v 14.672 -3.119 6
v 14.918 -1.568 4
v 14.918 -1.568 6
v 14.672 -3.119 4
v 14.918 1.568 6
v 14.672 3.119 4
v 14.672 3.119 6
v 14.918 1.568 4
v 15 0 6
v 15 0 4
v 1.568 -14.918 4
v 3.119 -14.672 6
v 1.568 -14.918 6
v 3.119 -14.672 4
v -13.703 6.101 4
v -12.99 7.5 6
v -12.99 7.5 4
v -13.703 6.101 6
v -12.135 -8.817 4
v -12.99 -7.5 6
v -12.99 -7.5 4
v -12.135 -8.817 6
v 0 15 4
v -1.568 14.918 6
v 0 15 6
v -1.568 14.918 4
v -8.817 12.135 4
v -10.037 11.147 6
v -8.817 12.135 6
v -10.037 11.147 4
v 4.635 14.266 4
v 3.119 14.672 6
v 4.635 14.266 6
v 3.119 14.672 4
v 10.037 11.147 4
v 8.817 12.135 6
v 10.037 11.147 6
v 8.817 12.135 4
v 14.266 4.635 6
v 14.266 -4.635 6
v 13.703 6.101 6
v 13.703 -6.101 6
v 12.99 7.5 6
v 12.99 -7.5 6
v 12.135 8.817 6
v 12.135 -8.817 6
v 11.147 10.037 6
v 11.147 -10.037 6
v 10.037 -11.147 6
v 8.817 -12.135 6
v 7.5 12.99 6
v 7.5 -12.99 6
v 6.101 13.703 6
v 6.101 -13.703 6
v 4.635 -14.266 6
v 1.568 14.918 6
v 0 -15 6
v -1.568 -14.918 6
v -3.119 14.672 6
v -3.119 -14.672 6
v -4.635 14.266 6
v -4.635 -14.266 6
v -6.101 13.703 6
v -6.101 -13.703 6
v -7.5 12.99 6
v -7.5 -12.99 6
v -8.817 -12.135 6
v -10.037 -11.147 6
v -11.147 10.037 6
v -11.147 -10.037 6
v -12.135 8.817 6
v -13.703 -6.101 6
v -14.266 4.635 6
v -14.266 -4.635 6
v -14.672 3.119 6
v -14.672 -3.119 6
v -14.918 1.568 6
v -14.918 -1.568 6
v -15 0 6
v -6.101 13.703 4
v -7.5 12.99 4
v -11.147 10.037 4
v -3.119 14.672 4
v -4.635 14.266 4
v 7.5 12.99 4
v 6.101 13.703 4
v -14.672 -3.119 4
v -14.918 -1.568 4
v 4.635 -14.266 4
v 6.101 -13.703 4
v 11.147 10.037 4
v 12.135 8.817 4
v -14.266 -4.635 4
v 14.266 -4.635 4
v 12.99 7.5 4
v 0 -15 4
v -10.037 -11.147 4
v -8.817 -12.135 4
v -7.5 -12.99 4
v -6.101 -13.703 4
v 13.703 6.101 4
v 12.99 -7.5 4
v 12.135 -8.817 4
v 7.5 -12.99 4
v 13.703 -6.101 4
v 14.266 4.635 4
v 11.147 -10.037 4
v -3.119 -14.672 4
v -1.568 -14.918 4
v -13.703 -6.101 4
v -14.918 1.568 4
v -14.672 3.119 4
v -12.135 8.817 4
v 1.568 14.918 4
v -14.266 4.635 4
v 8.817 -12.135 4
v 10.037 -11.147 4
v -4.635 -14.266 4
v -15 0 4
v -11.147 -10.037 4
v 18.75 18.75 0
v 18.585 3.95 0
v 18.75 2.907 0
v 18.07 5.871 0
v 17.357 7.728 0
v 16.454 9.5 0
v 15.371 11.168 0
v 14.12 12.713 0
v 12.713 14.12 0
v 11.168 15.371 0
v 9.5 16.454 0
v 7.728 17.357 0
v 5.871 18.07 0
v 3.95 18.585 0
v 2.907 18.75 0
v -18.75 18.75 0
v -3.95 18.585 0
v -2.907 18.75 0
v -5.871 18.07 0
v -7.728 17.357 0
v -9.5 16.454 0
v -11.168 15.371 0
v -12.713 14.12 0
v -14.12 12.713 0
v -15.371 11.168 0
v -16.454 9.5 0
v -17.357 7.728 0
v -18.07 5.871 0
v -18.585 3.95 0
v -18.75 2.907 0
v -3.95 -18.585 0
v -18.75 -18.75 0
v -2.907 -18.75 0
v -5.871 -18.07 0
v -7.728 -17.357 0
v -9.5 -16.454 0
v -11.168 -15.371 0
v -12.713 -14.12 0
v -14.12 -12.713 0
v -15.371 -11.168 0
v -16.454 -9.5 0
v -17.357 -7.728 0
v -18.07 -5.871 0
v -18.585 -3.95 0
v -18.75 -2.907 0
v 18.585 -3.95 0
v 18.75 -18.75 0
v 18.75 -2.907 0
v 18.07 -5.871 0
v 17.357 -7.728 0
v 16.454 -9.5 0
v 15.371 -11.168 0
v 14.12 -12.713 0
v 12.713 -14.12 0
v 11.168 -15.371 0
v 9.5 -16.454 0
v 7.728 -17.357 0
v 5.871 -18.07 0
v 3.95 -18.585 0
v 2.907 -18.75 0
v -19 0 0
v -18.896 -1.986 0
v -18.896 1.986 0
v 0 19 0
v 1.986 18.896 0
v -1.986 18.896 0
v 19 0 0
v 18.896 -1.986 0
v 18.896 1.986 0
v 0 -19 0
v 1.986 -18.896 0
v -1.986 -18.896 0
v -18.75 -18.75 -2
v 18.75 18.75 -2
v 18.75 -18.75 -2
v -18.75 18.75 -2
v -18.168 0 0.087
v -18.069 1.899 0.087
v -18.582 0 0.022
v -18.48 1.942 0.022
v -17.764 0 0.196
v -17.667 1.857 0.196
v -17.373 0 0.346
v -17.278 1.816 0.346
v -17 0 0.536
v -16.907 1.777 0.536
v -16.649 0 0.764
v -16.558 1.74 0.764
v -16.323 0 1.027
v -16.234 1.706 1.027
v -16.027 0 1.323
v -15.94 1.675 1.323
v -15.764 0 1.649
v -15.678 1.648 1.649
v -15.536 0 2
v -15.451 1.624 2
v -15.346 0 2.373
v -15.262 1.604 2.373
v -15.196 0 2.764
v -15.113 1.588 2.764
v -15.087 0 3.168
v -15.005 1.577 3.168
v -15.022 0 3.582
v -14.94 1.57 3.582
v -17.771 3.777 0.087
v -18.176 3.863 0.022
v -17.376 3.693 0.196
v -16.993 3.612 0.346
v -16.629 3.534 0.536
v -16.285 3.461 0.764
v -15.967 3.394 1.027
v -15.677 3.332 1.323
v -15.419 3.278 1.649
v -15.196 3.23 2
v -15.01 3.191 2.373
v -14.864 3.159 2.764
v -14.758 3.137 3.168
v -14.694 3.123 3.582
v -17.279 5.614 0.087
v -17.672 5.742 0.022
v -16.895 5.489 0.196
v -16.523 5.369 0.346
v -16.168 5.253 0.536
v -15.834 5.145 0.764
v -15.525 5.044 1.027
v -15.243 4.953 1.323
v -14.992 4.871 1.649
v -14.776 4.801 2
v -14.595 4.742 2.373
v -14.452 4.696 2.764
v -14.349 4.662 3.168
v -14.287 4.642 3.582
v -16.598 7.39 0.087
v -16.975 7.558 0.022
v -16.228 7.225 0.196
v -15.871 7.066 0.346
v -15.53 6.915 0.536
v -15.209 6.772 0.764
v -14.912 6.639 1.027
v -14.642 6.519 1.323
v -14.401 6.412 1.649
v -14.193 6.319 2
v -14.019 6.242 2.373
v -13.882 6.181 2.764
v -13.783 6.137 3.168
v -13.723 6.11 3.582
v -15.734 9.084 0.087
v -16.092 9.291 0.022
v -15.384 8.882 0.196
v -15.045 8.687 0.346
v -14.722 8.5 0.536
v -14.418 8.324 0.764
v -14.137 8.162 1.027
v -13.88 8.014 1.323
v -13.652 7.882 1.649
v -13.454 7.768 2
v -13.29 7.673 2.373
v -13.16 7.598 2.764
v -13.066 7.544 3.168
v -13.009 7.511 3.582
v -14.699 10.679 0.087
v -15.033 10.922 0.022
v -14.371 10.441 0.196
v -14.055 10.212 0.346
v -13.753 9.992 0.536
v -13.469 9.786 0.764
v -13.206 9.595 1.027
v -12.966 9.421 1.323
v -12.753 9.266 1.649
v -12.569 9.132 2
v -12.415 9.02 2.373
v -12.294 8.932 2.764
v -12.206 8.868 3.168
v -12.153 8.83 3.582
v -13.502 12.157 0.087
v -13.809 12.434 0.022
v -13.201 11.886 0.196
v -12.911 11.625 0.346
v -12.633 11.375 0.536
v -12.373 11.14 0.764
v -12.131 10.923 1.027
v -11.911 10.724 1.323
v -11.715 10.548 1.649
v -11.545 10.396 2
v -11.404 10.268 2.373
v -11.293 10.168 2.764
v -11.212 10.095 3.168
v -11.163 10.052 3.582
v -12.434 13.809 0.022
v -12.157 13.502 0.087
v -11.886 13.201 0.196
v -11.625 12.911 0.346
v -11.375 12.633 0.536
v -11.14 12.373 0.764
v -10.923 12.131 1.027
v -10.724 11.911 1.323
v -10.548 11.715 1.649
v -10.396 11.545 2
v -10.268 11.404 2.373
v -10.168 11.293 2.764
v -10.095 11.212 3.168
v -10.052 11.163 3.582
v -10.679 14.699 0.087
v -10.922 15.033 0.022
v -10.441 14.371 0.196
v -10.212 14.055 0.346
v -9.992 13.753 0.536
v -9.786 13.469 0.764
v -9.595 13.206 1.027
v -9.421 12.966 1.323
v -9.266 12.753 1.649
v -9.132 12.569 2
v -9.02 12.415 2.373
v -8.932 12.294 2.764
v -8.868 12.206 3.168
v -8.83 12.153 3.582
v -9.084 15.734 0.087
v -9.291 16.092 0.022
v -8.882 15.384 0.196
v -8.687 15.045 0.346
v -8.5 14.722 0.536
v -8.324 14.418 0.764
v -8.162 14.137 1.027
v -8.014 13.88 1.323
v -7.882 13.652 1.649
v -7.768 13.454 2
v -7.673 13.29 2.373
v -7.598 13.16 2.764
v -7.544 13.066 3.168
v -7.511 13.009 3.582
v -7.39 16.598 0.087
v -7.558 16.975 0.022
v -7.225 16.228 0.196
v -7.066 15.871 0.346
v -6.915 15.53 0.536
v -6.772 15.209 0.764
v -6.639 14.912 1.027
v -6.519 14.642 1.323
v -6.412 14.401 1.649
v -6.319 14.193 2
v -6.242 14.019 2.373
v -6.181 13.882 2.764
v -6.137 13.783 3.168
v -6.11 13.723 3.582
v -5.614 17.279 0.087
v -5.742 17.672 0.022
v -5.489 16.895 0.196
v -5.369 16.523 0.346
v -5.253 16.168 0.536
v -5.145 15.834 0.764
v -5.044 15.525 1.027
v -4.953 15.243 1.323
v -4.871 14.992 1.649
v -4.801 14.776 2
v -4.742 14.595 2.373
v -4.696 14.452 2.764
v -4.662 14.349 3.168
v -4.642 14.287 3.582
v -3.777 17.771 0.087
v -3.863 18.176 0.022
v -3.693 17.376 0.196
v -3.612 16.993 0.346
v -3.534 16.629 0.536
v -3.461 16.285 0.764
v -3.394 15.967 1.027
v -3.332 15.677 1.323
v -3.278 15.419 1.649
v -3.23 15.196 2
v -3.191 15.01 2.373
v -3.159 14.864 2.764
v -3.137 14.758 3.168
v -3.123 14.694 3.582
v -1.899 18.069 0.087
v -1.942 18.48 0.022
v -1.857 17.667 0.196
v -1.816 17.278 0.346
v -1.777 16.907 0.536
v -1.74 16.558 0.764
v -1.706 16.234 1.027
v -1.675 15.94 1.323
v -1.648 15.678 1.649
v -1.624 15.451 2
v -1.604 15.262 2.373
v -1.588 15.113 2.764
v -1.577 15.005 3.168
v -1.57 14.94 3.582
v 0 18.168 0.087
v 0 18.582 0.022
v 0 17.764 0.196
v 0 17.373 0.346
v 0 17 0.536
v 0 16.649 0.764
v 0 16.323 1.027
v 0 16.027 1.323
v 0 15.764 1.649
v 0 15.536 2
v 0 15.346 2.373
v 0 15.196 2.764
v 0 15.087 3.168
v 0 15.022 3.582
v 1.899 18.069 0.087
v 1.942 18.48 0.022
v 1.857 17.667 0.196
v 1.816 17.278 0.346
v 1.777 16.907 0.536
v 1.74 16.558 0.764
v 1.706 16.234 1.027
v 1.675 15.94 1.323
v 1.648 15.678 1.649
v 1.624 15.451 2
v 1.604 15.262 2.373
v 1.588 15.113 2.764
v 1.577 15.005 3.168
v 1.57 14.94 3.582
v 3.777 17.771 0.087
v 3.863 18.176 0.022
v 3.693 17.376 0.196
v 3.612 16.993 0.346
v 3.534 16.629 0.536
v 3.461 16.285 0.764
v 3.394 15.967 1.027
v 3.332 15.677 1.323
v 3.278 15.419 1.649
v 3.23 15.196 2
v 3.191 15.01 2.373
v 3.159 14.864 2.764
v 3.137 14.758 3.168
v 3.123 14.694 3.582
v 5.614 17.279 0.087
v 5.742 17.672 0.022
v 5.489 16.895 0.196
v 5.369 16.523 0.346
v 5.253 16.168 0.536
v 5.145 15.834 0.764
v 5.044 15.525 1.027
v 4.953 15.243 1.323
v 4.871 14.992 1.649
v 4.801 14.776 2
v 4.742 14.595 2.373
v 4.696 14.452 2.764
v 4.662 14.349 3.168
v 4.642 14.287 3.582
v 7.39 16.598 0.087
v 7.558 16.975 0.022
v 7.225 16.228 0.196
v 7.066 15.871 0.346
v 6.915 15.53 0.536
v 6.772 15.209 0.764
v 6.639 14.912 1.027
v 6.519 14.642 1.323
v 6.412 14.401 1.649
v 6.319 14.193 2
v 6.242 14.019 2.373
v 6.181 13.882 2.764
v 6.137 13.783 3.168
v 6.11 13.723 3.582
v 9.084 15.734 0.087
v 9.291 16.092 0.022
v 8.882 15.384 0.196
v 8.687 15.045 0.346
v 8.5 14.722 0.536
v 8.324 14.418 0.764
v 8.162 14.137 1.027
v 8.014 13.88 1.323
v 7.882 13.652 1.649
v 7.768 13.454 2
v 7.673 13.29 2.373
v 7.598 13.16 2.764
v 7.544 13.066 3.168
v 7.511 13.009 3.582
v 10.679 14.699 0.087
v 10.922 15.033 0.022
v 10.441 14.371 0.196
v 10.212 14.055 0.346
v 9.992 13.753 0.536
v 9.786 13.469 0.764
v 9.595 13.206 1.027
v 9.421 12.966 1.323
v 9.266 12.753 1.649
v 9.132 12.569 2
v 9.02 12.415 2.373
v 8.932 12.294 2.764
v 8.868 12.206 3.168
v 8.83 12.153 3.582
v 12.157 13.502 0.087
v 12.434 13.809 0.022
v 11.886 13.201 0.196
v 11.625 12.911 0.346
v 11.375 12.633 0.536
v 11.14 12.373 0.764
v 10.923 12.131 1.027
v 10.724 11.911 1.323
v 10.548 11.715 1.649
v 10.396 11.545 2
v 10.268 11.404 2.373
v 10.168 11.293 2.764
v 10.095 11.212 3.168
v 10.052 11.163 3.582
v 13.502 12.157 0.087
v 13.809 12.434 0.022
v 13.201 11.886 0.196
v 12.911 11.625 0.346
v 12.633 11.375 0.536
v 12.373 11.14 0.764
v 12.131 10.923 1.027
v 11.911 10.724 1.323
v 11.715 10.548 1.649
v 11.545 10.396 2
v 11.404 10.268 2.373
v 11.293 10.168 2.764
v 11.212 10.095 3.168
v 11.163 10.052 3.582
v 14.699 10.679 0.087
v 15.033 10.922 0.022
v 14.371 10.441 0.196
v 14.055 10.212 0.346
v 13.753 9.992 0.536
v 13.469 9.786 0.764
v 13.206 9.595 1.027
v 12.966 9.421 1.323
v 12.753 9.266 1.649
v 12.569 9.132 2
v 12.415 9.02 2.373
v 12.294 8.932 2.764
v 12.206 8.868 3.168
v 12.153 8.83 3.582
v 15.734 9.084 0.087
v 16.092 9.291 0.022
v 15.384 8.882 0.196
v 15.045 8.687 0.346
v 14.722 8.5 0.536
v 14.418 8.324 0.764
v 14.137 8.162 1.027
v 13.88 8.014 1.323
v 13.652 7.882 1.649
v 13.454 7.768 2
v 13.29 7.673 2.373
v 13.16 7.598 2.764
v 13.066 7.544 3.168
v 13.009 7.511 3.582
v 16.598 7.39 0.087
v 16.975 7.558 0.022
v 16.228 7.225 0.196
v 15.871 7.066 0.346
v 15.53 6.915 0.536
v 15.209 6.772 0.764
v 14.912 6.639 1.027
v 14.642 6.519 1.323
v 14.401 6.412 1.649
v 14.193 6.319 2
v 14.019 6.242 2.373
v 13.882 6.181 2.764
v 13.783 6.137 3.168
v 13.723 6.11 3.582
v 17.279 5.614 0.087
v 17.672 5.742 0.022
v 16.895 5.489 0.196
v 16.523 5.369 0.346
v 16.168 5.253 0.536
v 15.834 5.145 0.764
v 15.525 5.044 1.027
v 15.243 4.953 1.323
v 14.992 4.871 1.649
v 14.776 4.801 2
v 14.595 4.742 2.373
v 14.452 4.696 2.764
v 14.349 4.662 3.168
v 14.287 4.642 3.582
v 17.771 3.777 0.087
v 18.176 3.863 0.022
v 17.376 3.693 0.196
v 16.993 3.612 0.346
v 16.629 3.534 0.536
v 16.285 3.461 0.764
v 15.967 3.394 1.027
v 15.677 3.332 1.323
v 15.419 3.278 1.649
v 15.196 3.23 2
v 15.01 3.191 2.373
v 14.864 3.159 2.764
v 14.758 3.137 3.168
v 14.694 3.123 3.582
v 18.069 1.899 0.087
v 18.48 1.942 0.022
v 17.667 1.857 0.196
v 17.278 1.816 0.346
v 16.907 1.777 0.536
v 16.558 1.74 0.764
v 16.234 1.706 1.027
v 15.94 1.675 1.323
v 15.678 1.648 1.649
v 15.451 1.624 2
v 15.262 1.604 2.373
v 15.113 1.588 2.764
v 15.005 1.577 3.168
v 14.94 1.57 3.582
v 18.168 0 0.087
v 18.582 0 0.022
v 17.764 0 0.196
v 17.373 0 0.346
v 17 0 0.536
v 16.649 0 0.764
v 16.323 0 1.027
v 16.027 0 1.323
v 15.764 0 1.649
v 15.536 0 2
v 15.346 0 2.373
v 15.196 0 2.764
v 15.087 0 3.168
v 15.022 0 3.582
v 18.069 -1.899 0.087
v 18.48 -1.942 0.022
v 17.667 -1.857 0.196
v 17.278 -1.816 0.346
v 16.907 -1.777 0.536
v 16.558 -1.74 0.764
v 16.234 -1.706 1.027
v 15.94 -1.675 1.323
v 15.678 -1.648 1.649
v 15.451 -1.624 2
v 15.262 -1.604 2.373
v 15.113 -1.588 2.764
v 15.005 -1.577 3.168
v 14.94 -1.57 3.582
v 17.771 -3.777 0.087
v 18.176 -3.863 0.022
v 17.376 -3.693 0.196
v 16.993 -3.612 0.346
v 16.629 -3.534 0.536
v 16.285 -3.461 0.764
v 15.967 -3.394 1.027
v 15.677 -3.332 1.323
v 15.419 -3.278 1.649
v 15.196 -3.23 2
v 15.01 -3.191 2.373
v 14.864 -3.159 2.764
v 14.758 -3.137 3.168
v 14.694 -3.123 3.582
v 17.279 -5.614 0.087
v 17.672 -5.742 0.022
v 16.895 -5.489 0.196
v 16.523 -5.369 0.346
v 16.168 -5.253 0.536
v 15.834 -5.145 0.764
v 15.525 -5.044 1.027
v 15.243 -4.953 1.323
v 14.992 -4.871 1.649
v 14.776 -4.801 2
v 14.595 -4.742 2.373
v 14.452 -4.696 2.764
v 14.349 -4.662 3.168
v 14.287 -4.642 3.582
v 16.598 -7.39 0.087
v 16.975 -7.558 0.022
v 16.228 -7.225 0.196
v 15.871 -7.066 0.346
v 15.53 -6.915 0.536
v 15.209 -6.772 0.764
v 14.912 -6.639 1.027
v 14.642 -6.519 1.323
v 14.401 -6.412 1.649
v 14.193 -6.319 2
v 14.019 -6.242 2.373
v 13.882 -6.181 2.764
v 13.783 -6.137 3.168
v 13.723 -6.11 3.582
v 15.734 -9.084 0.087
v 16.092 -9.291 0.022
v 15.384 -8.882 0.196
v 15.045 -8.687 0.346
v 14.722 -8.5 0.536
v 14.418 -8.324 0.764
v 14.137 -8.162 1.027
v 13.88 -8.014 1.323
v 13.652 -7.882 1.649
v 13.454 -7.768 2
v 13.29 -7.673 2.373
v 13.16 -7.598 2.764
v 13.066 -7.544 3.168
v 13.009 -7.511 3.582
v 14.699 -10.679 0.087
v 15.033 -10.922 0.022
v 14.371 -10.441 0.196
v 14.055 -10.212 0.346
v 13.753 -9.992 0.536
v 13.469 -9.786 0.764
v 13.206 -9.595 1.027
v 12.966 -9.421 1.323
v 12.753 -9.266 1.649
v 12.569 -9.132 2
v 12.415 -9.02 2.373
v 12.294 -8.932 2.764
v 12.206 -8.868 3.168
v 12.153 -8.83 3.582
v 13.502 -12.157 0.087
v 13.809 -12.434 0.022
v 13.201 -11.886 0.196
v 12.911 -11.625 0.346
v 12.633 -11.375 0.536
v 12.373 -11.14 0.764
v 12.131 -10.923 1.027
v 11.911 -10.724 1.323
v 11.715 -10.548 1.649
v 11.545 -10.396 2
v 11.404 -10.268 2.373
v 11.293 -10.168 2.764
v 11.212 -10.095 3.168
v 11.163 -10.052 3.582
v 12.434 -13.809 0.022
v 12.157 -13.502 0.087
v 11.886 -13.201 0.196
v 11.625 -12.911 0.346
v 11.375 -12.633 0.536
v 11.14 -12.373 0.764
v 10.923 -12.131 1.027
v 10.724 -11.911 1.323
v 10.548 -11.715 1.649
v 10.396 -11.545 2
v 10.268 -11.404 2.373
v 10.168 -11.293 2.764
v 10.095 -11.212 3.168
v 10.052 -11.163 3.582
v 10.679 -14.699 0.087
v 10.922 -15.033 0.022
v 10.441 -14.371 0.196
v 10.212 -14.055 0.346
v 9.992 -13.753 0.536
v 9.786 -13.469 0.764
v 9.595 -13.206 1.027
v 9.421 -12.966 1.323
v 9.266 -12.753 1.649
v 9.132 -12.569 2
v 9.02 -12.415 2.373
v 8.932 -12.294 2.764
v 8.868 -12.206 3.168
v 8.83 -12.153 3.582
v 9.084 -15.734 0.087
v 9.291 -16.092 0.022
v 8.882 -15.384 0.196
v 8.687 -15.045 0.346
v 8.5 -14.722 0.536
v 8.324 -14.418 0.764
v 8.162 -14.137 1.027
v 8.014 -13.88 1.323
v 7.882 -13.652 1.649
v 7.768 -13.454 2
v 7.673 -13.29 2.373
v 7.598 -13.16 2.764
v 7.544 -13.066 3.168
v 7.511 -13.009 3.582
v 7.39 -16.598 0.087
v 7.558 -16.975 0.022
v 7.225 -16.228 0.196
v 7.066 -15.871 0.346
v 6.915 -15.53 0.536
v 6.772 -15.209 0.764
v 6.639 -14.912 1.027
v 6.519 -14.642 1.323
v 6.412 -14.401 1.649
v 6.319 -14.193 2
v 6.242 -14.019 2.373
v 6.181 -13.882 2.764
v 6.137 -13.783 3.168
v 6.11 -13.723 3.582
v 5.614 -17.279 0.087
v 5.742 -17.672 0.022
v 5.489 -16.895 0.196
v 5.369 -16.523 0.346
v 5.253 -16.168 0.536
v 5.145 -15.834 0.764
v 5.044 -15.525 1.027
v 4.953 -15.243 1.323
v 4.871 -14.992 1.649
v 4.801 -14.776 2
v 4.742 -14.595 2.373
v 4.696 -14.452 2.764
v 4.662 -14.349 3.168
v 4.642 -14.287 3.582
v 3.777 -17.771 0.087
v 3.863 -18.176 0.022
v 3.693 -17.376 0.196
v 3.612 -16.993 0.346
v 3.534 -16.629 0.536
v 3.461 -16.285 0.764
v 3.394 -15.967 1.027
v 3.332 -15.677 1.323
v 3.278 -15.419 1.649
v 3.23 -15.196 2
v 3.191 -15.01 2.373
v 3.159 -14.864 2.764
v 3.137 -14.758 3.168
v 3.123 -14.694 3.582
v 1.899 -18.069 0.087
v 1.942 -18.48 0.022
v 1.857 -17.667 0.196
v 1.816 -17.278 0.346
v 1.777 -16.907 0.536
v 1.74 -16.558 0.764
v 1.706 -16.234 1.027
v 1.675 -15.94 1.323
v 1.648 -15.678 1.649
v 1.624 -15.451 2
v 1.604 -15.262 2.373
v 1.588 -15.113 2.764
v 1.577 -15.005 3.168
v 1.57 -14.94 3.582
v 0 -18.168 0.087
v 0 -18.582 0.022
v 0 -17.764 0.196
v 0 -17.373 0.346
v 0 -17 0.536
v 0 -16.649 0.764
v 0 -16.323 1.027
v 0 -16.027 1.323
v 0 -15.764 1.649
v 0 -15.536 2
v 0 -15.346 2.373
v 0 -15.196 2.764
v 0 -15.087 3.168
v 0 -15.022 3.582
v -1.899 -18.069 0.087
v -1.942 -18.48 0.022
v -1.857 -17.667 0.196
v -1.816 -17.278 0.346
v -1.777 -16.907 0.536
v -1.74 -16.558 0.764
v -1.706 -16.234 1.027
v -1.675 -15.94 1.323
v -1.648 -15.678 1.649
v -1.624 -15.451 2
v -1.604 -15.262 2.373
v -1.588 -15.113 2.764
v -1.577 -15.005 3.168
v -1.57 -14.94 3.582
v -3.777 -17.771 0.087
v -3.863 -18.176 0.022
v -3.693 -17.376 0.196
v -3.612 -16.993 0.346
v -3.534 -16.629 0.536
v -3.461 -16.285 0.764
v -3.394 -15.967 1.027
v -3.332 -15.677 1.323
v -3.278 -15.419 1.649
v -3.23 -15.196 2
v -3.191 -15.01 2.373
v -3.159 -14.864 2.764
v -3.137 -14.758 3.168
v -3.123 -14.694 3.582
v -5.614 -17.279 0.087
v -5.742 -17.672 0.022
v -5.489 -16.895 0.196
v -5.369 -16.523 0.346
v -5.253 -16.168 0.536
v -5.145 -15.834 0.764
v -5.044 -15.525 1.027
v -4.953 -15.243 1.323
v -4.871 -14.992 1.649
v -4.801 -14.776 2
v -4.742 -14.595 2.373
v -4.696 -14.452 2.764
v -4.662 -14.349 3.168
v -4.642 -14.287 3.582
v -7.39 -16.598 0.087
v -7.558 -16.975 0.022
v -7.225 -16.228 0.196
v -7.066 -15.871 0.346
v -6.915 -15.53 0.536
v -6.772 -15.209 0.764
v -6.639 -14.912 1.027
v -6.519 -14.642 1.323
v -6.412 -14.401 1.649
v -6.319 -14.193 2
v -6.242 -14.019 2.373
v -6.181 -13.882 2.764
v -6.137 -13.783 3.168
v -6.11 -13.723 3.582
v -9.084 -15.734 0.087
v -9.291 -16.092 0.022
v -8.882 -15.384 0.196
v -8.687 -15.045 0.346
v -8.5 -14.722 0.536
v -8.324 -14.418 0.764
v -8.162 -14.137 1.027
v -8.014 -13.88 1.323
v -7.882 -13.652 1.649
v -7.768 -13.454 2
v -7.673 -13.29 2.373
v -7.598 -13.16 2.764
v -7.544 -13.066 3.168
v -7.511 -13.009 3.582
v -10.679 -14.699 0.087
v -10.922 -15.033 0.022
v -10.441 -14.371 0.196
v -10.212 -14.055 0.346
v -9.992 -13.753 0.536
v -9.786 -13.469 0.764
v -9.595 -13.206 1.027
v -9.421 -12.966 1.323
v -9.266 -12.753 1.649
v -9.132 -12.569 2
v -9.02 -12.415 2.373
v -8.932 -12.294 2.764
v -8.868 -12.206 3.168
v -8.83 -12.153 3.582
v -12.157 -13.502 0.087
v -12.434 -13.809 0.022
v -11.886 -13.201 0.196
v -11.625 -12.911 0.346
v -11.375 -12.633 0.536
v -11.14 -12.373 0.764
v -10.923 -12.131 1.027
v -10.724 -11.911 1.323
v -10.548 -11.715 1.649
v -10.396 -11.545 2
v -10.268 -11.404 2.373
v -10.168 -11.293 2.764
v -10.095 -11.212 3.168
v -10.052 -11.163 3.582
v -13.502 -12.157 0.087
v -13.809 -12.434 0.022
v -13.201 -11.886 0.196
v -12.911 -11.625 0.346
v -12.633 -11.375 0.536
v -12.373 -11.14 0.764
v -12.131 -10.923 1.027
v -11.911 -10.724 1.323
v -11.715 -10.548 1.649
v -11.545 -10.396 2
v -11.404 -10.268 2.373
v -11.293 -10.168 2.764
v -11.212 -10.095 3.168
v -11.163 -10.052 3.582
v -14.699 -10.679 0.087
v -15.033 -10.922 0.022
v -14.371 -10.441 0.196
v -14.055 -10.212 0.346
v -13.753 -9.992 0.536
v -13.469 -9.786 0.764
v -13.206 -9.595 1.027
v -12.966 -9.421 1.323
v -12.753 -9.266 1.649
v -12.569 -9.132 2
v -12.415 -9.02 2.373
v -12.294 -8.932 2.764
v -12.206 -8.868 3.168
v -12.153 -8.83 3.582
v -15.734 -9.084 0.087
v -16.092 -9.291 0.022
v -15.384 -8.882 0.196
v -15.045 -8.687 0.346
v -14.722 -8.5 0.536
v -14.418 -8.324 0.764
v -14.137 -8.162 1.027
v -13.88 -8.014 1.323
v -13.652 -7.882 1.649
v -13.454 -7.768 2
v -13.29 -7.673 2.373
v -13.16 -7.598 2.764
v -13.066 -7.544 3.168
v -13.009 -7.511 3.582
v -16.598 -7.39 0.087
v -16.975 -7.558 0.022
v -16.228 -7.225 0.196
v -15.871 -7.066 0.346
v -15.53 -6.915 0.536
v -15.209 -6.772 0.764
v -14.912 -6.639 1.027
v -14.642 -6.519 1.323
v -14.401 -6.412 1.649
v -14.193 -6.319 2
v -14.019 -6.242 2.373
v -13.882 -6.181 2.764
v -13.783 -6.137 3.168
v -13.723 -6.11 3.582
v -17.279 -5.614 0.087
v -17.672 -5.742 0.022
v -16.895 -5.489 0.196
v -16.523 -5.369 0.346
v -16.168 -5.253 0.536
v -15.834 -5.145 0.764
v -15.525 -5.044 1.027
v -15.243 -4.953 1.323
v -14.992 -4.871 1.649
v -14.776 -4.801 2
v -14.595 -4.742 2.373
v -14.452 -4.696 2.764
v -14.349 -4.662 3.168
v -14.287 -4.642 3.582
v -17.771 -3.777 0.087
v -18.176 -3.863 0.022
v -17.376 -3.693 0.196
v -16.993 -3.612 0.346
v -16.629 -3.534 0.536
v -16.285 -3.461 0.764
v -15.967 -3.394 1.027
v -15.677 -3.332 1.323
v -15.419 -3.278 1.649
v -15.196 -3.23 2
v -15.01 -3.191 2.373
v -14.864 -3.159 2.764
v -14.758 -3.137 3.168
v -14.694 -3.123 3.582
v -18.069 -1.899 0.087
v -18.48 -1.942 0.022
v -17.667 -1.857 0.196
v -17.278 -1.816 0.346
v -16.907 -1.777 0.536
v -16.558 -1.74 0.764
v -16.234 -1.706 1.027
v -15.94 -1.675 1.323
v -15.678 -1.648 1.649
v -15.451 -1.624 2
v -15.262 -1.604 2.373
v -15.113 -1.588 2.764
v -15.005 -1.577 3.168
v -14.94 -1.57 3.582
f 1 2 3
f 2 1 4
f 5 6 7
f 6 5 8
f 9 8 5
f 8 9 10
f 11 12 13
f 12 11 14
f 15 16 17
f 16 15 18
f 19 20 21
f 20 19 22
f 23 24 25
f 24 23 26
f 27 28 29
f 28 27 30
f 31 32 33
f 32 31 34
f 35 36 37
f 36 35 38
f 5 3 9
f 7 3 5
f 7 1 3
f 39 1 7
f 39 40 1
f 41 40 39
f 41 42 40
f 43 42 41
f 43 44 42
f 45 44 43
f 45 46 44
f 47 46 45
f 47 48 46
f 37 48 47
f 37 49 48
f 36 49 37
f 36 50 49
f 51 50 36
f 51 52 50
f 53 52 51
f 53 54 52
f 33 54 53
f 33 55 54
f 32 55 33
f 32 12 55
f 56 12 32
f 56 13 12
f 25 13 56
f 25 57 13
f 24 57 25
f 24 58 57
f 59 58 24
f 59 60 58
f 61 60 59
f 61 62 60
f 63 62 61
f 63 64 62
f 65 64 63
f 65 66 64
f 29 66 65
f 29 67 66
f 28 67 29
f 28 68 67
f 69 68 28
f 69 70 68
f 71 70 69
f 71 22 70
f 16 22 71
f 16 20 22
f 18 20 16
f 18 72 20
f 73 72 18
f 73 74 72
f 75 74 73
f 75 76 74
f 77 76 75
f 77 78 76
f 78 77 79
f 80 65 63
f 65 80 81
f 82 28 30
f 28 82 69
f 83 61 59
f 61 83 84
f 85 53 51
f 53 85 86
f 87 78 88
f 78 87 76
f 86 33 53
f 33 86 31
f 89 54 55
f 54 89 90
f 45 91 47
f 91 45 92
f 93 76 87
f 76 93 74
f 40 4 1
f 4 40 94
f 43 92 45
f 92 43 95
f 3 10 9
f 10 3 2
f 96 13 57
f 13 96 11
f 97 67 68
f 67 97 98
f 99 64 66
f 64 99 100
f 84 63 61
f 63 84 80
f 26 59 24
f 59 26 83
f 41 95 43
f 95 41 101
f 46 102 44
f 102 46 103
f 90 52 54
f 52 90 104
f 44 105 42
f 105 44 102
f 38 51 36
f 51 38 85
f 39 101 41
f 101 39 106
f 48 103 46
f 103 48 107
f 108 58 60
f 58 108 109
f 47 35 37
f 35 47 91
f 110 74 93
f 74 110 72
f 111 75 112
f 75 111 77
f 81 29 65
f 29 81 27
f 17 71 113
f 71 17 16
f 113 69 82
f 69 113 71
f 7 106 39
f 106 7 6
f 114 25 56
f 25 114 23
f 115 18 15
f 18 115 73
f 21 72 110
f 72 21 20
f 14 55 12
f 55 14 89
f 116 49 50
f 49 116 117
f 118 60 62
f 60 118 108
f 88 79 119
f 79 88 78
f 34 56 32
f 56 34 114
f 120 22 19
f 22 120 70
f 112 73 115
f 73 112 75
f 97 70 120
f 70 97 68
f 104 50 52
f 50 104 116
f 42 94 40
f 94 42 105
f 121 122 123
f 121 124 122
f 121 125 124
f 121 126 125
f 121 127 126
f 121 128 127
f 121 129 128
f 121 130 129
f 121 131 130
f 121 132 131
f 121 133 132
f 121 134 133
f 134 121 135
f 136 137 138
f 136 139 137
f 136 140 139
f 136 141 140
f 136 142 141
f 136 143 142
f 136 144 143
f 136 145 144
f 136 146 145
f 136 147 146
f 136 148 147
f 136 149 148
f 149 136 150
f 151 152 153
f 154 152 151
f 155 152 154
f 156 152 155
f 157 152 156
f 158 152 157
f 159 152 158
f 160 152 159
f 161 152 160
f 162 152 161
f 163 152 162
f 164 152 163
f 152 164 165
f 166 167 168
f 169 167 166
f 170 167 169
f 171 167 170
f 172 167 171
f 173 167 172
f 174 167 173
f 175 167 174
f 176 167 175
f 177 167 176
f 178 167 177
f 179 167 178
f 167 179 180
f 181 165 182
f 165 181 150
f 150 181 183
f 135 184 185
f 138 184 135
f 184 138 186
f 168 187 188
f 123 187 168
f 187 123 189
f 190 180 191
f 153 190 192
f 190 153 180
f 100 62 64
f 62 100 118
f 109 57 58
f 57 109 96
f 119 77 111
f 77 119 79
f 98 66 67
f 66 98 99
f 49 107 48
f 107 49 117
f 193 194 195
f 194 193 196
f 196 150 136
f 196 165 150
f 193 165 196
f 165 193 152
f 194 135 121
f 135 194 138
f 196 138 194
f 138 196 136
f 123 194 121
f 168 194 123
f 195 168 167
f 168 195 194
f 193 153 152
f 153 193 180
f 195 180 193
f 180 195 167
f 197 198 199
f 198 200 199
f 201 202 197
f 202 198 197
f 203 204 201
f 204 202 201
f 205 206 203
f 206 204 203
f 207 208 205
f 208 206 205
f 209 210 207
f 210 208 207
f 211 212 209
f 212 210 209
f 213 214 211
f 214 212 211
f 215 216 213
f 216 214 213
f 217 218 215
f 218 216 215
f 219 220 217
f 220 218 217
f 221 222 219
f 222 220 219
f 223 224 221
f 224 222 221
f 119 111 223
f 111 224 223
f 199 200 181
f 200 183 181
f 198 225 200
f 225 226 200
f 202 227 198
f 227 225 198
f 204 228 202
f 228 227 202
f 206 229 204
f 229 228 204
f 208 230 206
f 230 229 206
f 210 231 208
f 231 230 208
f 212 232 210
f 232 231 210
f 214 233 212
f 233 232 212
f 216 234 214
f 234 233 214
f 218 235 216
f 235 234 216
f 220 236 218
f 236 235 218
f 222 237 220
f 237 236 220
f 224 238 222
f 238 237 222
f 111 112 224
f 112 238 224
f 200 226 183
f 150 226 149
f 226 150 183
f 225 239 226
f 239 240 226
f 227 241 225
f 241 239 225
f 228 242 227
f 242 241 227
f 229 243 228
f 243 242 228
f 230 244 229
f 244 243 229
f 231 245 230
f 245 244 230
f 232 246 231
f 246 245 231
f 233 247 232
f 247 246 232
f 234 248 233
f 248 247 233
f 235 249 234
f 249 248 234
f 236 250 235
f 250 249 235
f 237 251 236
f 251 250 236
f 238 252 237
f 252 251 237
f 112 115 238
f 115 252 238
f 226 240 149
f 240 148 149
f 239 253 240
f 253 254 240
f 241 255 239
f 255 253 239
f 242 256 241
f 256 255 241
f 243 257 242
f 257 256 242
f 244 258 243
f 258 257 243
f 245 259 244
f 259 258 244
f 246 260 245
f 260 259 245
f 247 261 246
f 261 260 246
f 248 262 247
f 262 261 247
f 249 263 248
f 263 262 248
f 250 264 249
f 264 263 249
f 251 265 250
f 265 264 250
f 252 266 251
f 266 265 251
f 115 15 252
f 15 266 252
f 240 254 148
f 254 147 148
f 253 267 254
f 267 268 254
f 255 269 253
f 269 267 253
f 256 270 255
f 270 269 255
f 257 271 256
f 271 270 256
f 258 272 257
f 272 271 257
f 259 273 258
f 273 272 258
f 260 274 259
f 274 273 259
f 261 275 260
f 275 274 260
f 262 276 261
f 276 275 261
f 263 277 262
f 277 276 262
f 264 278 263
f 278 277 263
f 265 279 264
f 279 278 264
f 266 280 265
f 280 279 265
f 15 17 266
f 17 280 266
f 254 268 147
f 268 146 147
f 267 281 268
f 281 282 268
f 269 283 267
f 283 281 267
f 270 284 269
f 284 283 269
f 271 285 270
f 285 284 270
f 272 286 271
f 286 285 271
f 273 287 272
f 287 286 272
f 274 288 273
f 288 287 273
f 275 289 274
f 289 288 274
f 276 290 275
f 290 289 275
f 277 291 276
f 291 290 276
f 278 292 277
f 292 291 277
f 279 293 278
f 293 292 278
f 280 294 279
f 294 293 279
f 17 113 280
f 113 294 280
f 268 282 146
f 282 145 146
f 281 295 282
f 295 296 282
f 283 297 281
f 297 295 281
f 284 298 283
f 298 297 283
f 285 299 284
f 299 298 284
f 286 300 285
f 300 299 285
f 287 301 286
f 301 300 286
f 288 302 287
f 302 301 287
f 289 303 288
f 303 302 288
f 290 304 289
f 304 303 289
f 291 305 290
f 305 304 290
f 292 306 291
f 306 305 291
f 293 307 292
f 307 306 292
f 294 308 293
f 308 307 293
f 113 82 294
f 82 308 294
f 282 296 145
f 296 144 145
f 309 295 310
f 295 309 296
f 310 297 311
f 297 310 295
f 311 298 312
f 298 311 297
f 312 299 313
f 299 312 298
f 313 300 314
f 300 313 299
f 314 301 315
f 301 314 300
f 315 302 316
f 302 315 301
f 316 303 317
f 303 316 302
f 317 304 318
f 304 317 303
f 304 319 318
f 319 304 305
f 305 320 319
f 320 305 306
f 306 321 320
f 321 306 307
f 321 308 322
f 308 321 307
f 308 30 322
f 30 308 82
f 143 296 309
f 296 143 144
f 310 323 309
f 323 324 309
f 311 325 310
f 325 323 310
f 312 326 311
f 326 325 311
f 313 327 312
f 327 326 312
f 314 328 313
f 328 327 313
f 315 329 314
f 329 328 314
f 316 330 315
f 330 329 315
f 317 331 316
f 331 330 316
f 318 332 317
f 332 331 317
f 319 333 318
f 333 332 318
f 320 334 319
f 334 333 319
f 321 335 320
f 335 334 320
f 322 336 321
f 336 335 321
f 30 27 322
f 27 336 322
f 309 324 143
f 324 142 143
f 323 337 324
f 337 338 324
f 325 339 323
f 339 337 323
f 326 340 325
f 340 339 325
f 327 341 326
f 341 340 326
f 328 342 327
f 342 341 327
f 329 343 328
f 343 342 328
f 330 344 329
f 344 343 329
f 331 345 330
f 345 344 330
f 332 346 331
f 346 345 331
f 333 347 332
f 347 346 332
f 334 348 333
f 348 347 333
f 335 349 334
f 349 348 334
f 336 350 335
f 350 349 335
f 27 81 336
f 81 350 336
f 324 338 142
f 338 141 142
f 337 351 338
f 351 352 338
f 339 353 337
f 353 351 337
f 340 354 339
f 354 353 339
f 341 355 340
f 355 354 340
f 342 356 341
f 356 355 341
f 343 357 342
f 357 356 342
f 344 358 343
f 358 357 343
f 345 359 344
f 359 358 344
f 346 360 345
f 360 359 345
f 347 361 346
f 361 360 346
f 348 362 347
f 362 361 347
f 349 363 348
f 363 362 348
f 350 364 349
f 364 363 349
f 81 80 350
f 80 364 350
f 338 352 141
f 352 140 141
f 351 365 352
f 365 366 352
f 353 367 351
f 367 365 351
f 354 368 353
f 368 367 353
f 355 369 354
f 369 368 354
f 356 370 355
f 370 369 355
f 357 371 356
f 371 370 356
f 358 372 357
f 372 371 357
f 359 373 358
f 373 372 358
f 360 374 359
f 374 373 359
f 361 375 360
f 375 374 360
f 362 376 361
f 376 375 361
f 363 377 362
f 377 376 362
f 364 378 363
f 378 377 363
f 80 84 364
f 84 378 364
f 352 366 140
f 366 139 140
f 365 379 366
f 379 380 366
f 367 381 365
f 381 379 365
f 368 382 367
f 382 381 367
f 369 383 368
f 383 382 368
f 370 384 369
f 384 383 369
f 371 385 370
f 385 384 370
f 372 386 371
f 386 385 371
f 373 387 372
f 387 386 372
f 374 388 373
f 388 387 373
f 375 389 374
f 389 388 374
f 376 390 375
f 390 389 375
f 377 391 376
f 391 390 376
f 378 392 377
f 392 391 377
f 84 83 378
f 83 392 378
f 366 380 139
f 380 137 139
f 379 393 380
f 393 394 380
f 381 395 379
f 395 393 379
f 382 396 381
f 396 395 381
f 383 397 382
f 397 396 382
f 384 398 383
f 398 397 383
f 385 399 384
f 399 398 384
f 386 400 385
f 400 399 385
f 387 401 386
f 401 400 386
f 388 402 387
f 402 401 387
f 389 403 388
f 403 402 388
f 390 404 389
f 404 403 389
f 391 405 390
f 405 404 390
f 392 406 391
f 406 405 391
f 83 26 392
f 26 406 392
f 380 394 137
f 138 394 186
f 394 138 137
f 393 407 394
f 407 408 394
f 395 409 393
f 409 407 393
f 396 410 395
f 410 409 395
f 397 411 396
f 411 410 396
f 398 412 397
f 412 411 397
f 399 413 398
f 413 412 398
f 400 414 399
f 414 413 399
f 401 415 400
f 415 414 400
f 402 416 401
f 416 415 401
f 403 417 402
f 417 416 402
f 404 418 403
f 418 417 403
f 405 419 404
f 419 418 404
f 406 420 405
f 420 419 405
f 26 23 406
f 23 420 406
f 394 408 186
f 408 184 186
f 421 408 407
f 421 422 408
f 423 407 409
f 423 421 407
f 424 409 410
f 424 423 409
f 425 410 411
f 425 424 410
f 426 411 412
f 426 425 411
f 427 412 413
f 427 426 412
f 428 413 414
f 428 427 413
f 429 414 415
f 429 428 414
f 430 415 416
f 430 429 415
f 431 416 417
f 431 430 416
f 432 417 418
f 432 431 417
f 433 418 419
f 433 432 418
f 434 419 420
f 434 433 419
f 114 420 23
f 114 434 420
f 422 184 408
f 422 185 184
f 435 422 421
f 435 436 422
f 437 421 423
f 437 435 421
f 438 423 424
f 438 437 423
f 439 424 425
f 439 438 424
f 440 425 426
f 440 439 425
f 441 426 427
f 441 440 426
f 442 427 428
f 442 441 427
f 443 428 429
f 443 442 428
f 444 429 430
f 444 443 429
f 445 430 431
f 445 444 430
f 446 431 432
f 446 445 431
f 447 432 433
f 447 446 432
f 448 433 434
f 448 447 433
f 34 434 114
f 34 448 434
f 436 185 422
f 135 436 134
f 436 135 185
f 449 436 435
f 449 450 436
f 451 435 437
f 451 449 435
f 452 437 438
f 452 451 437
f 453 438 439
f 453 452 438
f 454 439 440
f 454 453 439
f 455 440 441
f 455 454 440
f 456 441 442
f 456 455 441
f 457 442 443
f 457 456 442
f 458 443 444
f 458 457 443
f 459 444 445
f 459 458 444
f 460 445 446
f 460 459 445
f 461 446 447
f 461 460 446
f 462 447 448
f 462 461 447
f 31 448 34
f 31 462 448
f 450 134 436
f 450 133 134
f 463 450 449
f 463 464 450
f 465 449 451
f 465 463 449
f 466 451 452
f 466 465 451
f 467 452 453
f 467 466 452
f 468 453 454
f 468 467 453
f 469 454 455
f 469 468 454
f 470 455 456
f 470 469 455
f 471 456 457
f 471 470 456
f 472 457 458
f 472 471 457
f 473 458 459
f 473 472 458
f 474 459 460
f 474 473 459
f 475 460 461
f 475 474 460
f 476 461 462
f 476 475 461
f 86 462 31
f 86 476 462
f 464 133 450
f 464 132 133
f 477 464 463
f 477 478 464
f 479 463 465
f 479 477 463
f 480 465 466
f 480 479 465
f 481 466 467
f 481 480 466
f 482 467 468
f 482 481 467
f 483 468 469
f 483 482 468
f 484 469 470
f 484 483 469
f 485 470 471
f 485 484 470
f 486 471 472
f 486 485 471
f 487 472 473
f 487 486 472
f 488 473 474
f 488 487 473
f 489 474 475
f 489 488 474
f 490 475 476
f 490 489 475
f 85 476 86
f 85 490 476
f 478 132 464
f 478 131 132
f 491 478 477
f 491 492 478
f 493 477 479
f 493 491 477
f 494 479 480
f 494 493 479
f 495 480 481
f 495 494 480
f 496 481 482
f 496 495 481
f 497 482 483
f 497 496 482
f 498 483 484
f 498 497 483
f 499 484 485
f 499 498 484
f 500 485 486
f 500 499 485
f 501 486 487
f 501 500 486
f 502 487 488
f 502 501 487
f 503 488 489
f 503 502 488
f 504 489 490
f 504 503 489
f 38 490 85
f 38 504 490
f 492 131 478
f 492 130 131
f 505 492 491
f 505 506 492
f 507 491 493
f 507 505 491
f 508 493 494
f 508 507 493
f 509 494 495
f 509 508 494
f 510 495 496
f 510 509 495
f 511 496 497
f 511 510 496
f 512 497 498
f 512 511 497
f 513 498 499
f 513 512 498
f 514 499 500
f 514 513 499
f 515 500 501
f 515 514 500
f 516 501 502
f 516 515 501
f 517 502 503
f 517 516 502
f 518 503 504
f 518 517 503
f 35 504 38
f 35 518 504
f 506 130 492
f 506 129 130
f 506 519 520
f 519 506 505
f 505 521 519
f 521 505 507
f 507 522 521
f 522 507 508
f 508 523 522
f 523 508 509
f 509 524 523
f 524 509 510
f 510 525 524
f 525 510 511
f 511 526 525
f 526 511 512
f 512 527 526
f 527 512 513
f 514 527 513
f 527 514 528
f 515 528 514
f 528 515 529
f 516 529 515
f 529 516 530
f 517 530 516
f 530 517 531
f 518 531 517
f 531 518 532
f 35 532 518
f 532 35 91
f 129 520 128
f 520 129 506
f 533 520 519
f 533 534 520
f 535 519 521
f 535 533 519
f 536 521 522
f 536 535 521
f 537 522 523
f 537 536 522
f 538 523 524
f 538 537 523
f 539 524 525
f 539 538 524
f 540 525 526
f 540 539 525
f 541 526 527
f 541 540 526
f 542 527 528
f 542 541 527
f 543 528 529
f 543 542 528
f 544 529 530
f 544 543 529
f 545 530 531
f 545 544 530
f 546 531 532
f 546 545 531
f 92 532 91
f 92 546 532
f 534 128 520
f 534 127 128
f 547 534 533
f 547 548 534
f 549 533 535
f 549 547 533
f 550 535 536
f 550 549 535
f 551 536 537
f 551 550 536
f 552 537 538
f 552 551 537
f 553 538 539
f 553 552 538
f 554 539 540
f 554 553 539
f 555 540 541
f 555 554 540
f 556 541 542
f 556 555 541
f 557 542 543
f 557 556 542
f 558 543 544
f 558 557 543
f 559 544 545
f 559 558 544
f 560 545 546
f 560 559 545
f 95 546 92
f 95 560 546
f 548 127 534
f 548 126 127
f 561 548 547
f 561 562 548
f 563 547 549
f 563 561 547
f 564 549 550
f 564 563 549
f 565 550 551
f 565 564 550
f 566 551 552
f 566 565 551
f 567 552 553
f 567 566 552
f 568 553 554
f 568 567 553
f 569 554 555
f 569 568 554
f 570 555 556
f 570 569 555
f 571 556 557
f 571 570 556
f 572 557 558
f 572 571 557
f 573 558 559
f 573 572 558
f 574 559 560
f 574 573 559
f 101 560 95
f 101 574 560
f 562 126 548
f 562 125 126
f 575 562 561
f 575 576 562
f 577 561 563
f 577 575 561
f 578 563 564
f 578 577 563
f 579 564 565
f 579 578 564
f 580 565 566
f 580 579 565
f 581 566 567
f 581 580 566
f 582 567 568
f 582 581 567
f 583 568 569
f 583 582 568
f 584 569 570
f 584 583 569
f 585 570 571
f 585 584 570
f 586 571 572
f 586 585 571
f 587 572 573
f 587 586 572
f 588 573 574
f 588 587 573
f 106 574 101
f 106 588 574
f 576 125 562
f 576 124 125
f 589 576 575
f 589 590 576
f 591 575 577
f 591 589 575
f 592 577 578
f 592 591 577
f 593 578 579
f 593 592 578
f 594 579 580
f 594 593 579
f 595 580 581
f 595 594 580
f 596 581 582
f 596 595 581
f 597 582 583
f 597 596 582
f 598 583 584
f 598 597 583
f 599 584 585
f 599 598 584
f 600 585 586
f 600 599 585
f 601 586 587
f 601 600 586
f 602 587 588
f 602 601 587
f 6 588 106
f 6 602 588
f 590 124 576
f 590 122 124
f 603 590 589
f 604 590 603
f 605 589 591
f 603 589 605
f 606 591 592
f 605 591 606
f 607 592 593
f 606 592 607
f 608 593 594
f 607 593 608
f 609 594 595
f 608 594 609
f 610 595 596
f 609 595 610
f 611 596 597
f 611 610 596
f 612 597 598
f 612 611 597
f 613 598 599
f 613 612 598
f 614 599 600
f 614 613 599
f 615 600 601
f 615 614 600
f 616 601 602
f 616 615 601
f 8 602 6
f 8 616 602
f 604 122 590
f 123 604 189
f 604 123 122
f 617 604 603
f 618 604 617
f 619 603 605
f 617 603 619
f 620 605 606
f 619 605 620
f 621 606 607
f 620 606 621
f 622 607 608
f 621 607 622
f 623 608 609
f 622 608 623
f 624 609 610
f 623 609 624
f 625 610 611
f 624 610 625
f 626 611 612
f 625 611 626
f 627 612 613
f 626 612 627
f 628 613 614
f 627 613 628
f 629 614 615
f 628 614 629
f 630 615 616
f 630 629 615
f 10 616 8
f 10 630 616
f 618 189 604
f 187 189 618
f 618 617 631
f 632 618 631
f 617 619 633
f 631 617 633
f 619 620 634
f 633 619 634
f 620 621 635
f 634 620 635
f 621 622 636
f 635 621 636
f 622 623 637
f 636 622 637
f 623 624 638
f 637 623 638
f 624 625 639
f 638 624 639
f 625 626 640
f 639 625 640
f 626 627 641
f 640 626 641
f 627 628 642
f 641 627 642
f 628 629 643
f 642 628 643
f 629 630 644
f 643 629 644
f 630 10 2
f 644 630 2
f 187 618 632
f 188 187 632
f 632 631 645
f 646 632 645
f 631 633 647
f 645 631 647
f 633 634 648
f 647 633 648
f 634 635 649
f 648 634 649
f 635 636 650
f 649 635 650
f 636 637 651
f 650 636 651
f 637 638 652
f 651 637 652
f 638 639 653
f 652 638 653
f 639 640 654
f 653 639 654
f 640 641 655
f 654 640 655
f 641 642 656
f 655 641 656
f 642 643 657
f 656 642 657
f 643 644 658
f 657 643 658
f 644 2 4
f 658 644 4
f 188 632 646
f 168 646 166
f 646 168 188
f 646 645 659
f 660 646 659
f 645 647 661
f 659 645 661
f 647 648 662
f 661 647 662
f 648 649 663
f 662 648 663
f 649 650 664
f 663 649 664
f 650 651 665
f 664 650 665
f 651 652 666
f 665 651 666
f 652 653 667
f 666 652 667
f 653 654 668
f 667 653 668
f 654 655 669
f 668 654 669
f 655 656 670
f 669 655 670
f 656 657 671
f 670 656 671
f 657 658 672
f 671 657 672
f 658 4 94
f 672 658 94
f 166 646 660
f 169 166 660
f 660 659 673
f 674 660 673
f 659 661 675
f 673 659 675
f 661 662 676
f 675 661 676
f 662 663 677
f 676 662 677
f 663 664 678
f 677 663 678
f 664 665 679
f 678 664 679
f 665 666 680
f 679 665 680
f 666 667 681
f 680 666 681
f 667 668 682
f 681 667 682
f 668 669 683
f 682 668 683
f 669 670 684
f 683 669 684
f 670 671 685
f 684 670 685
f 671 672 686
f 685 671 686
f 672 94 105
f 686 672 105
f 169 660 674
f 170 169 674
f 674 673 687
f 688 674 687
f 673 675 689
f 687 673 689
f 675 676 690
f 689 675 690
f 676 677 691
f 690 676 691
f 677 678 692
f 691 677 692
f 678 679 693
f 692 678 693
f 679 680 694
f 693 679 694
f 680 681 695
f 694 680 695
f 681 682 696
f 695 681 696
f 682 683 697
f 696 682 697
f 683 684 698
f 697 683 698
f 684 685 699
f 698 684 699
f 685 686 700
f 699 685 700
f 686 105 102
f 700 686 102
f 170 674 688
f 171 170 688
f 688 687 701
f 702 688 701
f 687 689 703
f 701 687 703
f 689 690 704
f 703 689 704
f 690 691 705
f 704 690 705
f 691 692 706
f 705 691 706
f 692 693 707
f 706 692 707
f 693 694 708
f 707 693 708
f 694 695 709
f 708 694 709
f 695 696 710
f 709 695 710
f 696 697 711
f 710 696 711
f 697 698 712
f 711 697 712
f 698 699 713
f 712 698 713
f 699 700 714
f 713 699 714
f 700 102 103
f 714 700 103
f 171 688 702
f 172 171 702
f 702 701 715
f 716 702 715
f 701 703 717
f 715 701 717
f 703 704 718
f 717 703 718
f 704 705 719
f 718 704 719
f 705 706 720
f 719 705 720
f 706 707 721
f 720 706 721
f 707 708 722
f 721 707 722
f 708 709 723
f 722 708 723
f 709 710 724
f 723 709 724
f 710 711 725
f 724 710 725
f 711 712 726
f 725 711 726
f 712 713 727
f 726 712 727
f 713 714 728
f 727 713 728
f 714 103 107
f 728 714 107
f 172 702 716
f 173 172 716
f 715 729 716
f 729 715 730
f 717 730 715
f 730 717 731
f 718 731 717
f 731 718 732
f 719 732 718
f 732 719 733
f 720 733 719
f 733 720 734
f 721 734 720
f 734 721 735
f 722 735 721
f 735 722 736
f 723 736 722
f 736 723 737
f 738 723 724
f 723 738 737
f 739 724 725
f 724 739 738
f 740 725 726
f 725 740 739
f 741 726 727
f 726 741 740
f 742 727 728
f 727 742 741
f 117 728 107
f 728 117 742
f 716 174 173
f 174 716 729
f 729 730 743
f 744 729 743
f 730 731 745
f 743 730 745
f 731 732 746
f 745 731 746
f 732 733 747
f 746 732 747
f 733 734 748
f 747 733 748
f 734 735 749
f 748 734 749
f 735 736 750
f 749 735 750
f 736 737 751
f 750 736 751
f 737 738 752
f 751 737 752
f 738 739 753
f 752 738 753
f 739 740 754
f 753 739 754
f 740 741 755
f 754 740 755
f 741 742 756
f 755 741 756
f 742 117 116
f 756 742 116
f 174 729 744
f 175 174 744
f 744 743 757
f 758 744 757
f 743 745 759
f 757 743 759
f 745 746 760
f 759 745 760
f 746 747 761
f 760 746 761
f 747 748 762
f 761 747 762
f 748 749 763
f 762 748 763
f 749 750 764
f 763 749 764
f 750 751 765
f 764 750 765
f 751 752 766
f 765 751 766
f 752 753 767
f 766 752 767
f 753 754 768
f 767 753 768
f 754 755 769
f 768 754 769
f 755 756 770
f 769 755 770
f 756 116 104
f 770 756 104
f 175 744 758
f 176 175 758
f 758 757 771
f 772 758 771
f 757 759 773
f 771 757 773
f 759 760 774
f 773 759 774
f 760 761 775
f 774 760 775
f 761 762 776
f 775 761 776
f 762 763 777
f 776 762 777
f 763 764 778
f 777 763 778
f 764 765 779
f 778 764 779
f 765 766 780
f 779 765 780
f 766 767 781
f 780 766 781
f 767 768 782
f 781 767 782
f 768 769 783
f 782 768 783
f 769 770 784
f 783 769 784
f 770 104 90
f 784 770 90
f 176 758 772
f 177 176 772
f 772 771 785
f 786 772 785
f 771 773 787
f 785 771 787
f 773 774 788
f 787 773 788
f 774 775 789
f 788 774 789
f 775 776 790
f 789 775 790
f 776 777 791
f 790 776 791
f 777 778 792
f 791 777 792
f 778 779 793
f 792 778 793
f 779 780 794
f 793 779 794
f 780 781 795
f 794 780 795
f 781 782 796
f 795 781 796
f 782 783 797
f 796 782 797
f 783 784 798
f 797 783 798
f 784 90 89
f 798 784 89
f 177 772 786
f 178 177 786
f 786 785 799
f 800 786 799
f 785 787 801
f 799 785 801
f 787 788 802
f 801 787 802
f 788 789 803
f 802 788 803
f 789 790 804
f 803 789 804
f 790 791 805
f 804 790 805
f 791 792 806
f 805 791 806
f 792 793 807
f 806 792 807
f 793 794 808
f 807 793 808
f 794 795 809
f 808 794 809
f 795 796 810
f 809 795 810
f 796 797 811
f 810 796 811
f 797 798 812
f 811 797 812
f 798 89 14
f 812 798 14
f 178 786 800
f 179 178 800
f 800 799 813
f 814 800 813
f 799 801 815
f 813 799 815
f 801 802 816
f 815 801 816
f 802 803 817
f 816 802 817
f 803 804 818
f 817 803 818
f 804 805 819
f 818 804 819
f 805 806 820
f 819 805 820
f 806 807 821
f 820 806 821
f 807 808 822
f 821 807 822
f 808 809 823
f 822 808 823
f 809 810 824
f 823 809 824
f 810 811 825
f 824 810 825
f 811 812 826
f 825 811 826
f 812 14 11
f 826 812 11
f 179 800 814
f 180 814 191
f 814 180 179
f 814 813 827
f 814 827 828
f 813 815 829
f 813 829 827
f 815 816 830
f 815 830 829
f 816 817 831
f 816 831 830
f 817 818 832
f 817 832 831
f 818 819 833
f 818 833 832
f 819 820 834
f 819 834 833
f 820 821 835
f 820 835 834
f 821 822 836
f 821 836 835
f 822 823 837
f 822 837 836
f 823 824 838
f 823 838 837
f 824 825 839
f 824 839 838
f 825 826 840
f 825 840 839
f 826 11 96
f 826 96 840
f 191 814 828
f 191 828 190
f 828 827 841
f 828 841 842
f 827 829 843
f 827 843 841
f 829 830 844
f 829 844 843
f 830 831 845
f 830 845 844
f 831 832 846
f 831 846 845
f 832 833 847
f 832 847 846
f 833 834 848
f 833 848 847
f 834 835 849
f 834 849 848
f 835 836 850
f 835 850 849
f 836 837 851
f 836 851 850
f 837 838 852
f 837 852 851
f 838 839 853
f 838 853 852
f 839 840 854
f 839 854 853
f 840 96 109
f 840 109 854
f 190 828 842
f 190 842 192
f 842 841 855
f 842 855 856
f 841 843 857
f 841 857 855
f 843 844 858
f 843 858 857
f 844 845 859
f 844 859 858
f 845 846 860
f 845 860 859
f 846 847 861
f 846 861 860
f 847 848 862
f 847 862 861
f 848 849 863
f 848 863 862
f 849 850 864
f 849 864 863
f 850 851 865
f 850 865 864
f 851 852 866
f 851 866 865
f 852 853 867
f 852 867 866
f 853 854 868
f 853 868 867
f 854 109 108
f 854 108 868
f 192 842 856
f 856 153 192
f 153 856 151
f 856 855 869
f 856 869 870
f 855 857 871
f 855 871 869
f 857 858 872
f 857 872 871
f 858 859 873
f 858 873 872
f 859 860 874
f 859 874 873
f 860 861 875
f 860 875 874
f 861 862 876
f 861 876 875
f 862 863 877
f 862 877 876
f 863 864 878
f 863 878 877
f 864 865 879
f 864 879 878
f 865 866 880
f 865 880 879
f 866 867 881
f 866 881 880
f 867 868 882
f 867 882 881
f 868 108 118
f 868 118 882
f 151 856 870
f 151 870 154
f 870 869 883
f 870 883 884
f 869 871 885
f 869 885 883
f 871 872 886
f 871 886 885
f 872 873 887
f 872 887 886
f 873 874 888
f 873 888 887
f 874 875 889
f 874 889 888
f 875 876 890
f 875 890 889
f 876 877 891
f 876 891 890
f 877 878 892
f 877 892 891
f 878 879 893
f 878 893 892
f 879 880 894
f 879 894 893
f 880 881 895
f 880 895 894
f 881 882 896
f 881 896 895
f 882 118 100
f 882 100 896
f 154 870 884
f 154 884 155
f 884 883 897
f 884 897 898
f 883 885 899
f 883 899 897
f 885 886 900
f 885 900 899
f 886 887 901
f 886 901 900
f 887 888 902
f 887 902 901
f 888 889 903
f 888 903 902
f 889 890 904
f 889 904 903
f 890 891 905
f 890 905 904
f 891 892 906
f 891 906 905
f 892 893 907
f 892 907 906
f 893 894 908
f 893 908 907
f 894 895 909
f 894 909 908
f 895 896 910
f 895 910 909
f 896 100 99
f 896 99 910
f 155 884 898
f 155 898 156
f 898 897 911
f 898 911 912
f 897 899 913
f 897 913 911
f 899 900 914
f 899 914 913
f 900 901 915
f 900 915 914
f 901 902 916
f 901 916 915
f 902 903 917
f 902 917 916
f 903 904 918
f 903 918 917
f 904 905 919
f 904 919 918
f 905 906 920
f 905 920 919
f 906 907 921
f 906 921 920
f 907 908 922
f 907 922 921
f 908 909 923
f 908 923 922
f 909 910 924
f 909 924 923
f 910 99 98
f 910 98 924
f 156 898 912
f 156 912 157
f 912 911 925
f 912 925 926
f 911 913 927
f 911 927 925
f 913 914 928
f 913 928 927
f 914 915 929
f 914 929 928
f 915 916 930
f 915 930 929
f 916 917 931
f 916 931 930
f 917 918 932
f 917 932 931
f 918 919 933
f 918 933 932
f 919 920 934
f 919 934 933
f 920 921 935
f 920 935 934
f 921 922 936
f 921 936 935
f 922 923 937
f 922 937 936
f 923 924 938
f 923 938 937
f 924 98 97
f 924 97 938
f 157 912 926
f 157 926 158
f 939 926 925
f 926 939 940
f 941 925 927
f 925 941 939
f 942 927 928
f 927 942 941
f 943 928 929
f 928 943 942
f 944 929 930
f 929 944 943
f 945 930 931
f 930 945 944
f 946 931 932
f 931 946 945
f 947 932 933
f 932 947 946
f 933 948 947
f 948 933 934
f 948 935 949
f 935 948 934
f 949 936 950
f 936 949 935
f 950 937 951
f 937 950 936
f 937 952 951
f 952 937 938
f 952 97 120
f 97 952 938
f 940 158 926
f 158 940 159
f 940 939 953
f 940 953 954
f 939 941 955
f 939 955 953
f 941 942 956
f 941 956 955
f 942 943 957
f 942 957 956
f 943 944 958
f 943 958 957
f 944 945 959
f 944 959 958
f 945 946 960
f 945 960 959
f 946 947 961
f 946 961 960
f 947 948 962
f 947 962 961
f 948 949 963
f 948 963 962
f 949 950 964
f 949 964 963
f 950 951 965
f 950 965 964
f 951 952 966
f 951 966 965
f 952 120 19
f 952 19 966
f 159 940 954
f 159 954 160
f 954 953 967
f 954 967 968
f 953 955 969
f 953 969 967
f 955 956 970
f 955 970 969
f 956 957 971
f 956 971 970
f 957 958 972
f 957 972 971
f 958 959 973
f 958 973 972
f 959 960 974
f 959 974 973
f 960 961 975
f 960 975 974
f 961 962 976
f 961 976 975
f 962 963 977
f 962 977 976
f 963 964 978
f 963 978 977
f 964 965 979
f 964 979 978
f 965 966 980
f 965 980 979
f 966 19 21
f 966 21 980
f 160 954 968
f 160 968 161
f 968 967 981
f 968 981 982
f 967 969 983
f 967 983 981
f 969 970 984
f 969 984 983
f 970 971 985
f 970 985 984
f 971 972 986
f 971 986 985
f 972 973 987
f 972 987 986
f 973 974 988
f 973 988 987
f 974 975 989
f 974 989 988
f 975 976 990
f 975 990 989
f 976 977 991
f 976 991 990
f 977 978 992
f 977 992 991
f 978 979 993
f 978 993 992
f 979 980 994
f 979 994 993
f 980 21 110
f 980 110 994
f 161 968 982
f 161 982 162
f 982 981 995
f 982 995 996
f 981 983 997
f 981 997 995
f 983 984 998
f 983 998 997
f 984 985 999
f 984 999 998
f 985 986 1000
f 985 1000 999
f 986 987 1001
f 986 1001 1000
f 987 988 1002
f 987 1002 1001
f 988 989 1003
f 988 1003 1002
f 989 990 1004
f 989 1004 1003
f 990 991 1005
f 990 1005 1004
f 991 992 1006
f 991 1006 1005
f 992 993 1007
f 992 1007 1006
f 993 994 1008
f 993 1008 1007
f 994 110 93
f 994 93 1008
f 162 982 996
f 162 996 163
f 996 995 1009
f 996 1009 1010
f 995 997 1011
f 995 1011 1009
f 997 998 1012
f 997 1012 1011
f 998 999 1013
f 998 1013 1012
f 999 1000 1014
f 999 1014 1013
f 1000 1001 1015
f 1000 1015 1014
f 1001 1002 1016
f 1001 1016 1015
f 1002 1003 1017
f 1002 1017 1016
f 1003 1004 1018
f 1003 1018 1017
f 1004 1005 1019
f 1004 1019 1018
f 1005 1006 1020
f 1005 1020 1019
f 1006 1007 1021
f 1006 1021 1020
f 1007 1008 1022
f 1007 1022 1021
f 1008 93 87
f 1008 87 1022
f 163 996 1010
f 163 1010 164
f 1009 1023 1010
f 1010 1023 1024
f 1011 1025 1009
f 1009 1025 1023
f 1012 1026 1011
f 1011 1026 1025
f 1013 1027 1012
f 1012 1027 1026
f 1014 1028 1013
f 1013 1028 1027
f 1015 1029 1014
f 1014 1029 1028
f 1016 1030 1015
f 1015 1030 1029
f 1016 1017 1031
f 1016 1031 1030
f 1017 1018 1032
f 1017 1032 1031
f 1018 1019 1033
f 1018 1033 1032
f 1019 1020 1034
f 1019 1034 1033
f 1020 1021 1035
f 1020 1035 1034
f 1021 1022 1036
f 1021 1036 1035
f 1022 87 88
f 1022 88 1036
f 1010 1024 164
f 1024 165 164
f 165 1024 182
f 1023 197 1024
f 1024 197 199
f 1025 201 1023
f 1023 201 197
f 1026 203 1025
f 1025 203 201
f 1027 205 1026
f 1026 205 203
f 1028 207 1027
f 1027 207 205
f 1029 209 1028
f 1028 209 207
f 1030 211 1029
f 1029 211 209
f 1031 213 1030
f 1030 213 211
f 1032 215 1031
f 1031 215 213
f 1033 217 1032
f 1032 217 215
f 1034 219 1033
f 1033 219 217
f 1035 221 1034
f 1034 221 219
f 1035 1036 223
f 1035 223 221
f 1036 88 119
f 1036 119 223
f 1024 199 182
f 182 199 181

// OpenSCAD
$fn = 60;
pipeRadius = 15;
pipeHeight = 6;
baseHeight = 2;
roundedRad = 4; 


rotate_extrude()
translate([pipeRadius, 0, 0])
difference()
{ 
        
    square([roundedRad, roundedRad]);

    translate([roundedRad, roundedRad])
      circle(r = roundedRad);
}

pipeStructure();

module pipeStructure()
{
    cylinder (r = pipeRadius, h = pipeHeight);
    
    translate([ 0, 0, -baseHeight])
    linear_extrude(height = baseHeight)
    square([pipeRadius *2.5, pipeRadius *2.5], center = true );
}
